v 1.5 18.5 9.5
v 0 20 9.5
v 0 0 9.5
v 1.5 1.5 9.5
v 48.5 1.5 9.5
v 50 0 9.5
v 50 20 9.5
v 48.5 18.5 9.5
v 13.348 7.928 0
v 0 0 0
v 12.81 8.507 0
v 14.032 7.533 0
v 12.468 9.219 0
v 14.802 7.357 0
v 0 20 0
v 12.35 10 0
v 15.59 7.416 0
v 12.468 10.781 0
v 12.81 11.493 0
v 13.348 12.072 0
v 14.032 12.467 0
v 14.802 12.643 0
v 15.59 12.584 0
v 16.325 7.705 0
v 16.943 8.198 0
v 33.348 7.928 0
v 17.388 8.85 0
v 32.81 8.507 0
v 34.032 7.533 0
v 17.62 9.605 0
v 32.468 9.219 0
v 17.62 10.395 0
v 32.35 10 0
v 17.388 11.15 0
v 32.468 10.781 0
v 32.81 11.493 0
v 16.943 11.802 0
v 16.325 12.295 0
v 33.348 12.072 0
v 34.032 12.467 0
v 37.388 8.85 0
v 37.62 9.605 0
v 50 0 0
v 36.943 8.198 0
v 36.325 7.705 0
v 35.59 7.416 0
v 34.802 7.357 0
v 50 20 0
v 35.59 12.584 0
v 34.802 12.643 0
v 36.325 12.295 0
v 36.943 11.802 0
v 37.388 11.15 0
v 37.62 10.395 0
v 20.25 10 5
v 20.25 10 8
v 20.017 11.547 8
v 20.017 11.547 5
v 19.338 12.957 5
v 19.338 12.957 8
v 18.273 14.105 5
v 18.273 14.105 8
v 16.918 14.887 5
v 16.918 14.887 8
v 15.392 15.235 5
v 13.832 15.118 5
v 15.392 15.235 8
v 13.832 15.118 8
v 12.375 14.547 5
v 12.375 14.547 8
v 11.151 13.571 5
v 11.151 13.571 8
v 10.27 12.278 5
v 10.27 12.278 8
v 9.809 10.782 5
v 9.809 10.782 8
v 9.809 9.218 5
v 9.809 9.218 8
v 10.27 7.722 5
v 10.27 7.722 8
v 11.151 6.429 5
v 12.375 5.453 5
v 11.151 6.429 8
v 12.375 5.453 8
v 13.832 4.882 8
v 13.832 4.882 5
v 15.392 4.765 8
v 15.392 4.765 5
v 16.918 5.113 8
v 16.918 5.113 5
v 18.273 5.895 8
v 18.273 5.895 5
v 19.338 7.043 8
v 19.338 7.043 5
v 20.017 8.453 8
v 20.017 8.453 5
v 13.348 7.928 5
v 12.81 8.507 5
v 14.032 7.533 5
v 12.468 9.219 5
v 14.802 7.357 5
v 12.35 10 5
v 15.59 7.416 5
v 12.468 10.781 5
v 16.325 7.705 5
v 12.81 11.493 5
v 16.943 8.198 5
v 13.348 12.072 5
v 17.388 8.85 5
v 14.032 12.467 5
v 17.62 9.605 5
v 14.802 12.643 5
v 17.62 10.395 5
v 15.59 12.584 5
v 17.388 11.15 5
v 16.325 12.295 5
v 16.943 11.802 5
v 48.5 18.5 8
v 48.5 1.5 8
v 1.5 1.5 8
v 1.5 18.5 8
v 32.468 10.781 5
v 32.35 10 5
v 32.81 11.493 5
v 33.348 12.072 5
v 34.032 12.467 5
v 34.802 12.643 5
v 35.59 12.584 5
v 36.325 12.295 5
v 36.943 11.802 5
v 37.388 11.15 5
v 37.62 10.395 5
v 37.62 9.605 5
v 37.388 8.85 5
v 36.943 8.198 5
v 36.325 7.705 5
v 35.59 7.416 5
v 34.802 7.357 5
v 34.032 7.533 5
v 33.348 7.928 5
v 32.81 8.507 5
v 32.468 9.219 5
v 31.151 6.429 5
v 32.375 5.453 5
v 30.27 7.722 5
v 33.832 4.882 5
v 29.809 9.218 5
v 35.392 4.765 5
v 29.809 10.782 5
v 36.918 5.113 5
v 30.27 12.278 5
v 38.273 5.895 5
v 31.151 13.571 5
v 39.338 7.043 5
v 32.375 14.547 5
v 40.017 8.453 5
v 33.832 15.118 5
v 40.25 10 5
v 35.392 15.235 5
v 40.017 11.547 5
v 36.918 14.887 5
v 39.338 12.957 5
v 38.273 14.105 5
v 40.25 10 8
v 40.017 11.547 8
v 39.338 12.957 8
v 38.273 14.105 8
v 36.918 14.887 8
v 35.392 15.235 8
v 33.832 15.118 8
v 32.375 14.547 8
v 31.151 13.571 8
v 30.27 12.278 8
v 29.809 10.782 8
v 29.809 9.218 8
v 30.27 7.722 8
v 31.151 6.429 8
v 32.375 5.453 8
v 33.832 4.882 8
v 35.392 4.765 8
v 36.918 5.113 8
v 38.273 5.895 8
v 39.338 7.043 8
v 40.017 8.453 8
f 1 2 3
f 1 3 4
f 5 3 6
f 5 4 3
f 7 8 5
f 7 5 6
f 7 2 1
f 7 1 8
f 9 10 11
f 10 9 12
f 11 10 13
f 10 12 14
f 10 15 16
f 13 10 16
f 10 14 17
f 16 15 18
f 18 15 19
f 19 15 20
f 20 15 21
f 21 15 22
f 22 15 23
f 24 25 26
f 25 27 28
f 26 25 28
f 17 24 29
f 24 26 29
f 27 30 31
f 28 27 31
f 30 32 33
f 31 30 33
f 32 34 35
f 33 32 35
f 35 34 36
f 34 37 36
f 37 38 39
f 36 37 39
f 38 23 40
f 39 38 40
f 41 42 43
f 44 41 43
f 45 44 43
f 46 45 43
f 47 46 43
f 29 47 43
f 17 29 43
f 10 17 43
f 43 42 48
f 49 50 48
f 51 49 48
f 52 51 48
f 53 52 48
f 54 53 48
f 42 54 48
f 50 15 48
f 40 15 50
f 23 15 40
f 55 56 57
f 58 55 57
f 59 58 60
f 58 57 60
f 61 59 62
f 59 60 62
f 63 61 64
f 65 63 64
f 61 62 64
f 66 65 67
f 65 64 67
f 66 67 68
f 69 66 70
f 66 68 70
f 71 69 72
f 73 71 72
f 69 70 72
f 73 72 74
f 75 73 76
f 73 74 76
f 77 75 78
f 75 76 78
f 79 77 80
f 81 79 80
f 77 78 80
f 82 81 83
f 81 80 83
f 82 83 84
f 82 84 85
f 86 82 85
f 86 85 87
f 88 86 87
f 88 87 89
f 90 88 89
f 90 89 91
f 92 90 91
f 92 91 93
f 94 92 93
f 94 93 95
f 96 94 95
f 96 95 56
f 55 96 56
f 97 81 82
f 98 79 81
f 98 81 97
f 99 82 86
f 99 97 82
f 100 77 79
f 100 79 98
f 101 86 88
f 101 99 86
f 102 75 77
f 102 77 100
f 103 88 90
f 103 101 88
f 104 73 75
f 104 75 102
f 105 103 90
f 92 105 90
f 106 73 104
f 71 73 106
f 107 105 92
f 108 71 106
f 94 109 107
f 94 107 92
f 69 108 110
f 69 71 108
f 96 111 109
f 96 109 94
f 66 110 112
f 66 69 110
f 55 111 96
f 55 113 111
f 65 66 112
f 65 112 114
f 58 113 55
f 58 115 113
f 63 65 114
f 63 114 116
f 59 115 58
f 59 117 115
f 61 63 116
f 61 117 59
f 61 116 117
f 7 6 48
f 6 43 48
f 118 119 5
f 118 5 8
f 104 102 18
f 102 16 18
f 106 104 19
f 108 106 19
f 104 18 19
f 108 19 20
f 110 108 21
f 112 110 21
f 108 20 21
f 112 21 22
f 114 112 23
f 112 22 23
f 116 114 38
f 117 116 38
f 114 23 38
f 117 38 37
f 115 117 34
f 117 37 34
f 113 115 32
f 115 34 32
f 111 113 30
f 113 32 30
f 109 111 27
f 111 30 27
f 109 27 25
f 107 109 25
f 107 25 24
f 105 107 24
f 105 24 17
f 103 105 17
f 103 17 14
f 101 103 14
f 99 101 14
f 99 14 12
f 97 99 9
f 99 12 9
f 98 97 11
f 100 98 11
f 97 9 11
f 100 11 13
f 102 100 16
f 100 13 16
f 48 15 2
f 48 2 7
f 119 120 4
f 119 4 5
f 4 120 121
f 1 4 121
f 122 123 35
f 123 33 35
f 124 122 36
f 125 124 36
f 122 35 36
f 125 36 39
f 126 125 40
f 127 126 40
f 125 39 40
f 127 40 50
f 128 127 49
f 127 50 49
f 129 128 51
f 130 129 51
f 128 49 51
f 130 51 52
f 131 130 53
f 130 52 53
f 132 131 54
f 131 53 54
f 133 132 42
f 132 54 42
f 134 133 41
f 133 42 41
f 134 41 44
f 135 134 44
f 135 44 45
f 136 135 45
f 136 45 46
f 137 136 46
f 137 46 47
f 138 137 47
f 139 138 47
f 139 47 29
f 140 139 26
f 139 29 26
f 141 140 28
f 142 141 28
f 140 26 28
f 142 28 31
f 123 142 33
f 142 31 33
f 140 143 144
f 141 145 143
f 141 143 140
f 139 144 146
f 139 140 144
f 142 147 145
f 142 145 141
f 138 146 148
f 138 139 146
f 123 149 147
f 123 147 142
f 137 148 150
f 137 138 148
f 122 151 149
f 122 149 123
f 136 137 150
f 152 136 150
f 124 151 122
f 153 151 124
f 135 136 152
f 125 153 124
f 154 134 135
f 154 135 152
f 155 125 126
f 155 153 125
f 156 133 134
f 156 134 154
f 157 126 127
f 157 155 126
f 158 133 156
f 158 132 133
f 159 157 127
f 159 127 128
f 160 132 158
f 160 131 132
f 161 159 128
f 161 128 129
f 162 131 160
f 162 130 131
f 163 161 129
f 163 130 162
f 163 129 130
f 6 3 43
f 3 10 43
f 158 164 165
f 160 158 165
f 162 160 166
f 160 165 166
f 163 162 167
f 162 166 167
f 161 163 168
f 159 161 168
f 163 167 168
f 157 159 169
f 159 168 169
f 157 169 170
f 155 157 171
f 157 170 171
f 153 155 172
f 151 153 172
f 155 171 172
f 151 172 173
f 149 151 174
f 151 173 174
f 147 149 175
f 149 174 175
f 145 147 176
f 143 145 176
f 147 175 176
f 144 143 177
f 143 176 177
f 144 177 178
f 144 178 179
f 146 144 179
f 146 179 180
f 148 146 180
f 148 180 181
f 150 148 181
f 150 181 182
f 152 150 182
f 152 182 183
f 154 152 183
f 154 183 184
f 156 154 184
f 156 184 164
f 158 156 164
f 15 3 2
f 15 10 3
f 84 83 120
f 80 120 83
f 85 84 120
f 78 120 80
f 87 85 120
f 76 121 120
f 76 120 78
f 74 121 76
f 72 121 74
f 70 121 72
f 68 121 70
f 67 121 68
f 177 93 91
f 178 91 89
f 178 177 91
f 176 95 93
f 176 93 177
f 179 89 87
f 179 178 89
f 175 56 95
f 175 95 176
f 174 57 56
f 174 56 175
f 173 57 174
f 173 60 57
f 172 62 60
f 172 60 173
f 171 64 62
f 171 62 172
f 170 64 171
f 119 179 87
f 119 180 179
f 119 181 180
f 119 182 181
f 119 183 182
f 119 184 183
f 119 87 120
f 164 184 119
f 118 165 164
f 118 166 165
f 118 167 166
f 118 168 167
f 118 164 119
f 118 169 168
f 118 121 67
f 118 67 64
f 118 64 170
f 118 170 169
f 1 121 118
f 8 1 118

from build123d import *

# Parameters (mm, degrees)
F0_W           = 50
F0_H           = 20
F1_DEPTH       = 8
F3_D           = 5.3
F3_CBORE_D     = 10.5
F3_CBORE_DEPTH = 3
F4_W           = 50
F4_H           = 20
F4_W_2         = 47
F4_H_2         = 17
F5_DEPTH       = 1.5


with BuildPart() as f1:
    # F0 (on Top) → F1 (new body)
    with BuildSketch(Plane.XY):
        with Locations((25, 10)):
            Rectangle(F0_W, F0_H)
    extrude(amount=F1_DEPTH)

    # F3 (through all)
    with Locations(Plane.XY.offset(8)):
        with Locations((15, 10), (35, 10)):
            CounterBoreHole(F3_D / 2, F3_CBORE_D / 2, F3_CBORE_DEPTH)

    # F4 (on face) → F5 (join)
    with BuildSketch(Plane.XY.offset(8)):
        with Locations((25, 10)):
            Rectangle(F4_W, F4_H)
        with Locations((25, 10)):
            Rectangle(F4_W_2, F4_H_2, mode=Mode.SUBTRACT)
    extrude(amount=F5_DEPTH)


solid = f1.part
